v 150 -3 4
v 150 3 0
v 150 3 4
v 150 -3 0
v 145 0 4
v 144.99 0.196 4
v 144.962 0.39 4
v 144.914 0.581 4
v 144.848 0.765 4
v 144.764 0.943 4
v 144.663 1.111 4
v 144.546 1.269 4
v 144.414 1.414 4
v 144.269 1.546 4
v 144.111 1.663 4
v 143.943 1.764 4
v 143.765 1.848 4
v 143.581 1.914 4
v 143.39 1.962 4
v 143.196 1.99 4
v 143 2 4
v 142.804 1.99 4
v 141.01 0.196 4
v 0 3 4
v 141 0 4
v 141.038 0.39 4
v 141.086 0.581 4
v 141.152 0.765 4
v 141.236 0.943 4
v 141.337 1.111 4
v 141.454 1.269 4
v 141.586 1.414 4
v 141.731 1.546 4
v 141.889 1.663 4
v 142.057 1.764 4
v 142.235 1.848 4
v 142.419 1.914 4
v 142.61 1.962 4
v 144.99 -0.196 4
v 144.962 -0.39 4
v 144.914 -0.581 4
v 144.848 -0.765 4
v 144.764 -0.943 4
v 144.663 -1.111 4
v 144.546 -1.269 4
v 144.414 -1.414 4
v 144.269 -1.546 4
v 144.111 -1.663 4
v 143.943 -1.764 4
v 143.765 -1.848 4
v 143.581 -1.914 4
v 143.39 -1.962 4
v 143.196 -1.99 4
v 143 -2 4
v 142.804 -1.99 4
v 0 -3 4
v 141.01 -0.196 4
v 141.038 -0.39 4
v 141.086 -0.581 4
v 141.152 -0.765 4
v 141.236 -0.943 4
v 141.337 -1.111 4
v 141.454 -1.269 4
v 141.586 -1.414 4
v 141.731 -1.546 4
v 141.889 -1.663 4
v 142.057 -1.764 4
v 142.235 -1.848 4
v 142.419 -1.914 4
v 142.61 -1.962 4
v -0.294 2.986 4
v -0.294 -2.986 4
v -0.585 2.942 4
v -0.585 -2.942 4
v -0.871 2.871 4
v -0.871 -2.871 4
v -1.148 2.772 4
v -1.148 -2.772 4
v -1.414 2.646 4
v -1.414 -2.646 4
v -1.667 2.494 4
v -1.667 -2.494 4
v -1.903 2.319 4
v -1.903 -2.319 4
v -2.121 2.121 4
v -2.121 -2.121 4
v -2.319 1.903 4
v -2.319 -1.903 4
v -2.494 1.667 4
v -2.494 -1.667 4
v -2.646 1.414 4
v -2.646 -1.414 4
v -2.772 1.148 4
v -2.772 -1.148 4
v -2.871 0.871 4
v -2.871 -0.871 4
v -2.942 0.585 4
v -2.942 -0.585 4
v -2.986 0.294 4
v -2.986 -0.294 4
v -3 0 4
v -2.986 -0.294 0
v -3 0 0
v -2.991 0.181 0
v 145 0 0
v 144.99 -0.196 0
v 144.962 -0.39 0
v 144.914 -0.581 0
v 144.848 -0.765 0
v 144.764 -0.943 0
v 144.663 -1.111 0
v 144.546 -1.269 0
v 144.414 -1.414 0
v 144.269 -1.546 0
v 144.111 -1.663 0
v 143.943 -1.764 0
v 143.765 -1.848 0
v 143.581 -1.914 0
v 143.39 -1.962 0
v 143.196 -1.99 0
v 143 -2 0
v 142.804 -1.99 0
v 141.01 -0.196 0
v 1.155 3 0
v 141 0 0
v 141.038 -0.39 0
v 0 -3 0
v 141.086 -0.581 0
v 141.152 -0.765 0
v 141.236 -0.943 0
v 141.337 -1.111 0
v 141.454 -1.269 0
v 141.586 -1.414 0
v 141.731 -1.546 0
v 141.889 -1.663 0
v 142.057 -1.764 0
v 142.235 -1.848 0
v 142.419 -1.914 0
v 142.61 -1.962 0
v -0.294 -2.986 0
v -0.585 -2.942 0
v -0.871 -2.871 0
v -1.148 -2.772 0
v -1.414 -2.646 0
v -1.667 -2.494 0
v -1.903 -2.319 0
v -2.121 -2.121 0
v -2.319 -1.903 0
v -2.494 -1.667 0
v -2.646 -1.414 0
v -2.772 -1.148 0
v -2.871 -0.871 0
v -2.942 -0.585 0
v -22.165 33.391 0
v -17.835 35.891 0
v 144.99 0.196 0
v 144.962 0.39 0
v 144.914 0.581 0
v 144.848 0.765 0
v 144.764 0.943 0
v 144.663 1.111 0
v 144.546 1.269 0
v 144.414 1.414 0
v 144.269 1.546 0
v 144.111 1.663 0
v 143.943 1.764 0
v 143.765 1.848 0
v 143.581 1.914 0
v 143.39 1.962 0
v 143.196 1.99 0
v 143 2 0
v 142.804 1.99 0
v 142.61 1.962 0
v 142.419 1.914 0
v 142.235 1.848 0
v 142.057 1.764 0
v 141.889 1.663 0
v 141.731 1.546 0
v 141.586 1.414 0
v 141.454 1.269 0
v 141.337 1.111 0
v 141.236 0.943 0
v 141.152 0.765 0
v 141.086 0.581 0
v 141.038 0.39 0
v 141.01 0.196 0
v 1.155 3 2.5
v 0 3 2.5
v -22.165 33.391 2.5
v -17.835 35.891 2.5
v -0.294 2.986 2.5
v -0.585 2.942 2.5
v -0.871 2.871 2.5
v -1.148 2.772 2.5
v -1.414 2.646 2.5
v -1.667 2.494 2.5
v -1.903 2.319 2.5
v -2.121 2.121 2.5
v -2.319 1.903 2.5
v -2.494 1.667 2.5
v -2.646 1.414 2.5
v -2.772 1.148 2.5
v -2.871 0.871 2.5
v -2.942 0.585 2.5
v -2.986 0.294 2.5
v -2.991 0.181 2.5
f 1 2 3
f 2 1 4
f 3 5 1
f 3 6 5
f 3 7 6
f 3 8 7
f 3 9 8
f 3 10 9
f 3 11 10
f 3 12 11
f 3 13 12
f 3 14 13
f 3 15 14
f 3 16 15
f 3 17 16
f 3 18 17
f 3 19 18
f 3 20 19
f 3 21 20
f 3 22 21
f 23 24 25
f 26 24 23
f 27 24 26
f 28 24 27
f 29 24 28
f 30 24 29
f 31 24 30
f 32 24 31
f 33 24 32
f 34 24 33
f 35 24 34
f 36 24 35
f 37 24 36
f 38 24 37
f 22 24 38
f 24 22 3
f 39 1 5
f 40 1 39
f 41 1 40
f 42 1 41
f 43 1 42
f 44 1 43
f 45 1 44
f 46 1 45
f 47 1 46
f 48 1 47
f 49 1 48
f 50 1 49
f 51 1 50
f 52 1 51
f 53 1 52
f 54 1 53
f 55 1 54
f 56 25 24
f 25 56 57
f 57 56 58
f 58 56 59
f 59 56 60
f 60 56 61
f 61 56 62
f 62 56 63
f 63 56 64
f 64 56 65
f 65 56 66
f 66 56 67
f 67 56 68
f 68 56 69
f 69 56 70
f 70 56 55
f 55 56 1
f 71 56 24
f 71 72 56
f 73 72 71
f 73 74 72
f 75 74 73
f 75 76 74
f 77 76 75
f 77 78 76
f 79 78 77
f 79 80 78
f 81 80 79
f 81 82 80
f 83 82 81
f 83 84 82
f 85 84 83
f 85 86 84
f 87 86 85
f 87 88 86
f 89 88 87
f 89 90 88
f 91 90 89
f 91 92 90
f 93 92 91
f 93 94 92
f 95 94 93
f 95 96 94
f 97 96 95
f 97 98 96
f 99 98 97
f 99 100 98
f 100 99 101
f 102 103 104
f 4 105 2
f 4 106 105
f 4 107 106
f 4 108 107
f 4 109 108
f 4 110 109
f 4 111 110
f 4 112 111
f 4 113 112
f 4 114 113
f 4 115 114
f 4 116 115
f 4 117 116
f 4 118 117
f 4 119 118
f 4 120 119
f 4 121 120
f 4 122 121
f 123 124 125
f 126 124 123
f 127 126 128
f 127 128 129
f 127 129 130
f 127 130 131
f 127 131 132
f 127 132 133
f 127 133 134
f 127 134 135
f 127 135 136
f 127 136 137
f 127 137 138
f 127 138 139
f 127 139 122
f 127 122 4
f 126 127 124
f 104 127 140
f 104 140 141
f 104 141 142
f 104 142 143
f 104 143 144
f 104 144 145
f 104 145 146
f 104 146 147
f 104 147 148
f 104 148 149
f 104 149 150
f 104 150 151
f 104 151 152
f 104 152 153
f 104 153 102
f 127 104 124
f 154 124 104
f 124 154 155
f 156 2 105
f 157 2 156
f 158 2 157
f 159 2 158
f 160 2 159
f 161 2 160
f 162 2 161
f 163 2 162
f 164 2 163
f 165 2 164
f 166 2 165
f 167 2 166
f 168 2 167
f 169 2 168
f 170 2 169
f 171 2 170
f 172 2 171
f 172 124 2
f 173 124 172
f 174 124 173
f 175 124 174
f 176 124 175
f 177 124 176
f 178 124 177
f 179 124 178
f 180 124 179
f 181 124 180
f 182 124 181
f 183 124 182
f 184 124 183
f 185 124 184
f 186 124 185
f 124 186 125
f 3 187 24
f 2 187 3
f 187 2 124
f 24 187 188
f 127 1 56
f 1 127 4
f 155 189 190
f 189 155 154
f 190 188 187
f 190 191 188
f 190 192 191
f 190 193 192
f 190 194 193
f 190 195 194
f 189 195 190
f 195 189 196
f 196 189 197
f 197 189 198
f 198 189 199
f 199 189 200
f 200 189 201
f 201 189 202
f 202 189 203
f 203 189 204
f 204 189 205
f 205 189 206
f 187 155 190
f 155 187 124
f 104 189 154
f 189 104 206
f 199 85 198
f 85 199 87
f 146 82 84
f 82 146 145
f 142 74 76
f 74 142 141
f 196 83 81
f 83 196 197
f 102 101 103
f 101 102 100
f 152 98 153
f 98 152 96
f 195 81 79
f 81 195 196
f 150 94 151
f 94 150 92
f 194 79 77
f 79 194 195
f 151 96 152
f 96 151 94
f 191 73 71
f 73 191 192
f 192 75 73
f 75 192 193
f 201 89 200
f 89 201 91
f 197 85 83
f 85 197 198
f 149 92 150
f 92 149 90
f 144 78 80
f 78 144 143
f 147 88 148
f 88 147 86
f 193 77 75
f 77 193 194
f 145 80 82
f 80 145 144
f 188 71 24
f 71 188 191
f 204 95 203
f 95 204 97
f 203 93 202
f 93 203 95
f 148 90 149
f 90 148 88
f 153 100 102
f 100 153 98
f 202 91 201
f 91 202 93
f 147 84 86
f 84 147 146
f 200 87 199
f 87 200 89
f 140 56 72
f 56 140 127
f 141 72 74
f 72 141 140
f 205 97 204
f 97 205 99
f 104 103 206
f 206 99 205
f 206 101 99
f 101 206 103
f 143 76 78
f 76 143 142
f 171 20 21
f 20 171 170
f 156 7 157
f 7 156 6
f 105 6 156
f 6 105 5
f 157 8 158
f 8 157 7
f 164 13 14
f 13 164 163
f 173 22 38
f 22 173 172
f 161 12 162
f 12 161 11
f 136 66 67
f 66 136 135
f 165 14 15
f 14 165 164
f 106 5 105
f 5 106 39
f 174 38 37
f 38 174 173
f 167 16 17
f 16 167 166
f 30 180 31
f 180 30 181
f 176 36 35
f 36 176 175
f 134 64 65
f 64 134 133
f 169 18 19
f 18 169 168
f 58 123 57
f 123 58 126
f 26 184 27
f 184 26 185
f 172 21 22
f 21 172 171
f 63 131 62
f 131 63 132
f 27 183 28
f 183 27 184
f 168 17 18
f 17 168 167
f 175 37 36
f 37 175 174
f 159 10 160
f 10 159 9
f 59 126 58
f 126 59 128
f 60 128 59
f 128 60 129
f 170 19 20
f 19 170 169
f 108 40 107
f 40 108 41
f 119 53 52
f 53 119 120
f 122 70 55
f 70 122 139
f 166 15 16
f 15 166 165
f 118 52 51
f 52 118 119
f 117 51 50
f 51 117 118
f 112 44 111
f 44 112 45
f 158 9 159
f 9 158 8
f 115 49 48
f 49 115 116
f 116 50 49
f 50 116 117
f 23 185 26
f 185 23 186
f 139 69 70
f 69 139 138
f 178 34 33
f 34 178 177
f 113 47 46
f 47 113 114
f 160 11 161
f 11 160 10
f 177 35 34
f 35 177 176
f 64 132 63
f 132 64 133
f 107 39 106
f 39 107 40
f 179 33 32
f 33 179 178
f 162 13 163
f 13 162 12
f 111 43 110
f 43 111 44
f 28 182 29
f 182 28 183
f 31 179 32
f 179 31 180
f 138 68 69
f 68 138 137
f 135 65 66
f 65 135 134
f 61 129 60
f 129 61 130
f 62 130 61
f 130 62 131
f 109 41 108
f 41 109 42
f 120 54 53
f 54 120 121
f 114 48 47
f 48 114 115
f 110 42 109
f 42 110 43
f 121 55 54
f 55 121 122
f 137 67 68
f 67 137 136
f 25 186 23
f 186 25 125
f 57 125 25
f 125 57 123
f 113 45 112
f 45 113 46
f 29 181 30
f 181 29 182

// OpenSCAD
// KNOWN-RIGHT ALTERNATIVE (must pass): a correct part coded independently, the foot as a polygon from its corners
$fn=64; u=[cos(120),sin(120)]; n=[cos(30),sin(30)]*2.5;
difference(){ union(){ translate([0,-3,0]) cube([150,6,4]); linear_extrude(2.5) polygon([n, 40*u+n, 40*u-n, -n]); cylinder(d=6,h=4); }
 translate([143,0,-1]) cylinder(d=4,h=6); }
